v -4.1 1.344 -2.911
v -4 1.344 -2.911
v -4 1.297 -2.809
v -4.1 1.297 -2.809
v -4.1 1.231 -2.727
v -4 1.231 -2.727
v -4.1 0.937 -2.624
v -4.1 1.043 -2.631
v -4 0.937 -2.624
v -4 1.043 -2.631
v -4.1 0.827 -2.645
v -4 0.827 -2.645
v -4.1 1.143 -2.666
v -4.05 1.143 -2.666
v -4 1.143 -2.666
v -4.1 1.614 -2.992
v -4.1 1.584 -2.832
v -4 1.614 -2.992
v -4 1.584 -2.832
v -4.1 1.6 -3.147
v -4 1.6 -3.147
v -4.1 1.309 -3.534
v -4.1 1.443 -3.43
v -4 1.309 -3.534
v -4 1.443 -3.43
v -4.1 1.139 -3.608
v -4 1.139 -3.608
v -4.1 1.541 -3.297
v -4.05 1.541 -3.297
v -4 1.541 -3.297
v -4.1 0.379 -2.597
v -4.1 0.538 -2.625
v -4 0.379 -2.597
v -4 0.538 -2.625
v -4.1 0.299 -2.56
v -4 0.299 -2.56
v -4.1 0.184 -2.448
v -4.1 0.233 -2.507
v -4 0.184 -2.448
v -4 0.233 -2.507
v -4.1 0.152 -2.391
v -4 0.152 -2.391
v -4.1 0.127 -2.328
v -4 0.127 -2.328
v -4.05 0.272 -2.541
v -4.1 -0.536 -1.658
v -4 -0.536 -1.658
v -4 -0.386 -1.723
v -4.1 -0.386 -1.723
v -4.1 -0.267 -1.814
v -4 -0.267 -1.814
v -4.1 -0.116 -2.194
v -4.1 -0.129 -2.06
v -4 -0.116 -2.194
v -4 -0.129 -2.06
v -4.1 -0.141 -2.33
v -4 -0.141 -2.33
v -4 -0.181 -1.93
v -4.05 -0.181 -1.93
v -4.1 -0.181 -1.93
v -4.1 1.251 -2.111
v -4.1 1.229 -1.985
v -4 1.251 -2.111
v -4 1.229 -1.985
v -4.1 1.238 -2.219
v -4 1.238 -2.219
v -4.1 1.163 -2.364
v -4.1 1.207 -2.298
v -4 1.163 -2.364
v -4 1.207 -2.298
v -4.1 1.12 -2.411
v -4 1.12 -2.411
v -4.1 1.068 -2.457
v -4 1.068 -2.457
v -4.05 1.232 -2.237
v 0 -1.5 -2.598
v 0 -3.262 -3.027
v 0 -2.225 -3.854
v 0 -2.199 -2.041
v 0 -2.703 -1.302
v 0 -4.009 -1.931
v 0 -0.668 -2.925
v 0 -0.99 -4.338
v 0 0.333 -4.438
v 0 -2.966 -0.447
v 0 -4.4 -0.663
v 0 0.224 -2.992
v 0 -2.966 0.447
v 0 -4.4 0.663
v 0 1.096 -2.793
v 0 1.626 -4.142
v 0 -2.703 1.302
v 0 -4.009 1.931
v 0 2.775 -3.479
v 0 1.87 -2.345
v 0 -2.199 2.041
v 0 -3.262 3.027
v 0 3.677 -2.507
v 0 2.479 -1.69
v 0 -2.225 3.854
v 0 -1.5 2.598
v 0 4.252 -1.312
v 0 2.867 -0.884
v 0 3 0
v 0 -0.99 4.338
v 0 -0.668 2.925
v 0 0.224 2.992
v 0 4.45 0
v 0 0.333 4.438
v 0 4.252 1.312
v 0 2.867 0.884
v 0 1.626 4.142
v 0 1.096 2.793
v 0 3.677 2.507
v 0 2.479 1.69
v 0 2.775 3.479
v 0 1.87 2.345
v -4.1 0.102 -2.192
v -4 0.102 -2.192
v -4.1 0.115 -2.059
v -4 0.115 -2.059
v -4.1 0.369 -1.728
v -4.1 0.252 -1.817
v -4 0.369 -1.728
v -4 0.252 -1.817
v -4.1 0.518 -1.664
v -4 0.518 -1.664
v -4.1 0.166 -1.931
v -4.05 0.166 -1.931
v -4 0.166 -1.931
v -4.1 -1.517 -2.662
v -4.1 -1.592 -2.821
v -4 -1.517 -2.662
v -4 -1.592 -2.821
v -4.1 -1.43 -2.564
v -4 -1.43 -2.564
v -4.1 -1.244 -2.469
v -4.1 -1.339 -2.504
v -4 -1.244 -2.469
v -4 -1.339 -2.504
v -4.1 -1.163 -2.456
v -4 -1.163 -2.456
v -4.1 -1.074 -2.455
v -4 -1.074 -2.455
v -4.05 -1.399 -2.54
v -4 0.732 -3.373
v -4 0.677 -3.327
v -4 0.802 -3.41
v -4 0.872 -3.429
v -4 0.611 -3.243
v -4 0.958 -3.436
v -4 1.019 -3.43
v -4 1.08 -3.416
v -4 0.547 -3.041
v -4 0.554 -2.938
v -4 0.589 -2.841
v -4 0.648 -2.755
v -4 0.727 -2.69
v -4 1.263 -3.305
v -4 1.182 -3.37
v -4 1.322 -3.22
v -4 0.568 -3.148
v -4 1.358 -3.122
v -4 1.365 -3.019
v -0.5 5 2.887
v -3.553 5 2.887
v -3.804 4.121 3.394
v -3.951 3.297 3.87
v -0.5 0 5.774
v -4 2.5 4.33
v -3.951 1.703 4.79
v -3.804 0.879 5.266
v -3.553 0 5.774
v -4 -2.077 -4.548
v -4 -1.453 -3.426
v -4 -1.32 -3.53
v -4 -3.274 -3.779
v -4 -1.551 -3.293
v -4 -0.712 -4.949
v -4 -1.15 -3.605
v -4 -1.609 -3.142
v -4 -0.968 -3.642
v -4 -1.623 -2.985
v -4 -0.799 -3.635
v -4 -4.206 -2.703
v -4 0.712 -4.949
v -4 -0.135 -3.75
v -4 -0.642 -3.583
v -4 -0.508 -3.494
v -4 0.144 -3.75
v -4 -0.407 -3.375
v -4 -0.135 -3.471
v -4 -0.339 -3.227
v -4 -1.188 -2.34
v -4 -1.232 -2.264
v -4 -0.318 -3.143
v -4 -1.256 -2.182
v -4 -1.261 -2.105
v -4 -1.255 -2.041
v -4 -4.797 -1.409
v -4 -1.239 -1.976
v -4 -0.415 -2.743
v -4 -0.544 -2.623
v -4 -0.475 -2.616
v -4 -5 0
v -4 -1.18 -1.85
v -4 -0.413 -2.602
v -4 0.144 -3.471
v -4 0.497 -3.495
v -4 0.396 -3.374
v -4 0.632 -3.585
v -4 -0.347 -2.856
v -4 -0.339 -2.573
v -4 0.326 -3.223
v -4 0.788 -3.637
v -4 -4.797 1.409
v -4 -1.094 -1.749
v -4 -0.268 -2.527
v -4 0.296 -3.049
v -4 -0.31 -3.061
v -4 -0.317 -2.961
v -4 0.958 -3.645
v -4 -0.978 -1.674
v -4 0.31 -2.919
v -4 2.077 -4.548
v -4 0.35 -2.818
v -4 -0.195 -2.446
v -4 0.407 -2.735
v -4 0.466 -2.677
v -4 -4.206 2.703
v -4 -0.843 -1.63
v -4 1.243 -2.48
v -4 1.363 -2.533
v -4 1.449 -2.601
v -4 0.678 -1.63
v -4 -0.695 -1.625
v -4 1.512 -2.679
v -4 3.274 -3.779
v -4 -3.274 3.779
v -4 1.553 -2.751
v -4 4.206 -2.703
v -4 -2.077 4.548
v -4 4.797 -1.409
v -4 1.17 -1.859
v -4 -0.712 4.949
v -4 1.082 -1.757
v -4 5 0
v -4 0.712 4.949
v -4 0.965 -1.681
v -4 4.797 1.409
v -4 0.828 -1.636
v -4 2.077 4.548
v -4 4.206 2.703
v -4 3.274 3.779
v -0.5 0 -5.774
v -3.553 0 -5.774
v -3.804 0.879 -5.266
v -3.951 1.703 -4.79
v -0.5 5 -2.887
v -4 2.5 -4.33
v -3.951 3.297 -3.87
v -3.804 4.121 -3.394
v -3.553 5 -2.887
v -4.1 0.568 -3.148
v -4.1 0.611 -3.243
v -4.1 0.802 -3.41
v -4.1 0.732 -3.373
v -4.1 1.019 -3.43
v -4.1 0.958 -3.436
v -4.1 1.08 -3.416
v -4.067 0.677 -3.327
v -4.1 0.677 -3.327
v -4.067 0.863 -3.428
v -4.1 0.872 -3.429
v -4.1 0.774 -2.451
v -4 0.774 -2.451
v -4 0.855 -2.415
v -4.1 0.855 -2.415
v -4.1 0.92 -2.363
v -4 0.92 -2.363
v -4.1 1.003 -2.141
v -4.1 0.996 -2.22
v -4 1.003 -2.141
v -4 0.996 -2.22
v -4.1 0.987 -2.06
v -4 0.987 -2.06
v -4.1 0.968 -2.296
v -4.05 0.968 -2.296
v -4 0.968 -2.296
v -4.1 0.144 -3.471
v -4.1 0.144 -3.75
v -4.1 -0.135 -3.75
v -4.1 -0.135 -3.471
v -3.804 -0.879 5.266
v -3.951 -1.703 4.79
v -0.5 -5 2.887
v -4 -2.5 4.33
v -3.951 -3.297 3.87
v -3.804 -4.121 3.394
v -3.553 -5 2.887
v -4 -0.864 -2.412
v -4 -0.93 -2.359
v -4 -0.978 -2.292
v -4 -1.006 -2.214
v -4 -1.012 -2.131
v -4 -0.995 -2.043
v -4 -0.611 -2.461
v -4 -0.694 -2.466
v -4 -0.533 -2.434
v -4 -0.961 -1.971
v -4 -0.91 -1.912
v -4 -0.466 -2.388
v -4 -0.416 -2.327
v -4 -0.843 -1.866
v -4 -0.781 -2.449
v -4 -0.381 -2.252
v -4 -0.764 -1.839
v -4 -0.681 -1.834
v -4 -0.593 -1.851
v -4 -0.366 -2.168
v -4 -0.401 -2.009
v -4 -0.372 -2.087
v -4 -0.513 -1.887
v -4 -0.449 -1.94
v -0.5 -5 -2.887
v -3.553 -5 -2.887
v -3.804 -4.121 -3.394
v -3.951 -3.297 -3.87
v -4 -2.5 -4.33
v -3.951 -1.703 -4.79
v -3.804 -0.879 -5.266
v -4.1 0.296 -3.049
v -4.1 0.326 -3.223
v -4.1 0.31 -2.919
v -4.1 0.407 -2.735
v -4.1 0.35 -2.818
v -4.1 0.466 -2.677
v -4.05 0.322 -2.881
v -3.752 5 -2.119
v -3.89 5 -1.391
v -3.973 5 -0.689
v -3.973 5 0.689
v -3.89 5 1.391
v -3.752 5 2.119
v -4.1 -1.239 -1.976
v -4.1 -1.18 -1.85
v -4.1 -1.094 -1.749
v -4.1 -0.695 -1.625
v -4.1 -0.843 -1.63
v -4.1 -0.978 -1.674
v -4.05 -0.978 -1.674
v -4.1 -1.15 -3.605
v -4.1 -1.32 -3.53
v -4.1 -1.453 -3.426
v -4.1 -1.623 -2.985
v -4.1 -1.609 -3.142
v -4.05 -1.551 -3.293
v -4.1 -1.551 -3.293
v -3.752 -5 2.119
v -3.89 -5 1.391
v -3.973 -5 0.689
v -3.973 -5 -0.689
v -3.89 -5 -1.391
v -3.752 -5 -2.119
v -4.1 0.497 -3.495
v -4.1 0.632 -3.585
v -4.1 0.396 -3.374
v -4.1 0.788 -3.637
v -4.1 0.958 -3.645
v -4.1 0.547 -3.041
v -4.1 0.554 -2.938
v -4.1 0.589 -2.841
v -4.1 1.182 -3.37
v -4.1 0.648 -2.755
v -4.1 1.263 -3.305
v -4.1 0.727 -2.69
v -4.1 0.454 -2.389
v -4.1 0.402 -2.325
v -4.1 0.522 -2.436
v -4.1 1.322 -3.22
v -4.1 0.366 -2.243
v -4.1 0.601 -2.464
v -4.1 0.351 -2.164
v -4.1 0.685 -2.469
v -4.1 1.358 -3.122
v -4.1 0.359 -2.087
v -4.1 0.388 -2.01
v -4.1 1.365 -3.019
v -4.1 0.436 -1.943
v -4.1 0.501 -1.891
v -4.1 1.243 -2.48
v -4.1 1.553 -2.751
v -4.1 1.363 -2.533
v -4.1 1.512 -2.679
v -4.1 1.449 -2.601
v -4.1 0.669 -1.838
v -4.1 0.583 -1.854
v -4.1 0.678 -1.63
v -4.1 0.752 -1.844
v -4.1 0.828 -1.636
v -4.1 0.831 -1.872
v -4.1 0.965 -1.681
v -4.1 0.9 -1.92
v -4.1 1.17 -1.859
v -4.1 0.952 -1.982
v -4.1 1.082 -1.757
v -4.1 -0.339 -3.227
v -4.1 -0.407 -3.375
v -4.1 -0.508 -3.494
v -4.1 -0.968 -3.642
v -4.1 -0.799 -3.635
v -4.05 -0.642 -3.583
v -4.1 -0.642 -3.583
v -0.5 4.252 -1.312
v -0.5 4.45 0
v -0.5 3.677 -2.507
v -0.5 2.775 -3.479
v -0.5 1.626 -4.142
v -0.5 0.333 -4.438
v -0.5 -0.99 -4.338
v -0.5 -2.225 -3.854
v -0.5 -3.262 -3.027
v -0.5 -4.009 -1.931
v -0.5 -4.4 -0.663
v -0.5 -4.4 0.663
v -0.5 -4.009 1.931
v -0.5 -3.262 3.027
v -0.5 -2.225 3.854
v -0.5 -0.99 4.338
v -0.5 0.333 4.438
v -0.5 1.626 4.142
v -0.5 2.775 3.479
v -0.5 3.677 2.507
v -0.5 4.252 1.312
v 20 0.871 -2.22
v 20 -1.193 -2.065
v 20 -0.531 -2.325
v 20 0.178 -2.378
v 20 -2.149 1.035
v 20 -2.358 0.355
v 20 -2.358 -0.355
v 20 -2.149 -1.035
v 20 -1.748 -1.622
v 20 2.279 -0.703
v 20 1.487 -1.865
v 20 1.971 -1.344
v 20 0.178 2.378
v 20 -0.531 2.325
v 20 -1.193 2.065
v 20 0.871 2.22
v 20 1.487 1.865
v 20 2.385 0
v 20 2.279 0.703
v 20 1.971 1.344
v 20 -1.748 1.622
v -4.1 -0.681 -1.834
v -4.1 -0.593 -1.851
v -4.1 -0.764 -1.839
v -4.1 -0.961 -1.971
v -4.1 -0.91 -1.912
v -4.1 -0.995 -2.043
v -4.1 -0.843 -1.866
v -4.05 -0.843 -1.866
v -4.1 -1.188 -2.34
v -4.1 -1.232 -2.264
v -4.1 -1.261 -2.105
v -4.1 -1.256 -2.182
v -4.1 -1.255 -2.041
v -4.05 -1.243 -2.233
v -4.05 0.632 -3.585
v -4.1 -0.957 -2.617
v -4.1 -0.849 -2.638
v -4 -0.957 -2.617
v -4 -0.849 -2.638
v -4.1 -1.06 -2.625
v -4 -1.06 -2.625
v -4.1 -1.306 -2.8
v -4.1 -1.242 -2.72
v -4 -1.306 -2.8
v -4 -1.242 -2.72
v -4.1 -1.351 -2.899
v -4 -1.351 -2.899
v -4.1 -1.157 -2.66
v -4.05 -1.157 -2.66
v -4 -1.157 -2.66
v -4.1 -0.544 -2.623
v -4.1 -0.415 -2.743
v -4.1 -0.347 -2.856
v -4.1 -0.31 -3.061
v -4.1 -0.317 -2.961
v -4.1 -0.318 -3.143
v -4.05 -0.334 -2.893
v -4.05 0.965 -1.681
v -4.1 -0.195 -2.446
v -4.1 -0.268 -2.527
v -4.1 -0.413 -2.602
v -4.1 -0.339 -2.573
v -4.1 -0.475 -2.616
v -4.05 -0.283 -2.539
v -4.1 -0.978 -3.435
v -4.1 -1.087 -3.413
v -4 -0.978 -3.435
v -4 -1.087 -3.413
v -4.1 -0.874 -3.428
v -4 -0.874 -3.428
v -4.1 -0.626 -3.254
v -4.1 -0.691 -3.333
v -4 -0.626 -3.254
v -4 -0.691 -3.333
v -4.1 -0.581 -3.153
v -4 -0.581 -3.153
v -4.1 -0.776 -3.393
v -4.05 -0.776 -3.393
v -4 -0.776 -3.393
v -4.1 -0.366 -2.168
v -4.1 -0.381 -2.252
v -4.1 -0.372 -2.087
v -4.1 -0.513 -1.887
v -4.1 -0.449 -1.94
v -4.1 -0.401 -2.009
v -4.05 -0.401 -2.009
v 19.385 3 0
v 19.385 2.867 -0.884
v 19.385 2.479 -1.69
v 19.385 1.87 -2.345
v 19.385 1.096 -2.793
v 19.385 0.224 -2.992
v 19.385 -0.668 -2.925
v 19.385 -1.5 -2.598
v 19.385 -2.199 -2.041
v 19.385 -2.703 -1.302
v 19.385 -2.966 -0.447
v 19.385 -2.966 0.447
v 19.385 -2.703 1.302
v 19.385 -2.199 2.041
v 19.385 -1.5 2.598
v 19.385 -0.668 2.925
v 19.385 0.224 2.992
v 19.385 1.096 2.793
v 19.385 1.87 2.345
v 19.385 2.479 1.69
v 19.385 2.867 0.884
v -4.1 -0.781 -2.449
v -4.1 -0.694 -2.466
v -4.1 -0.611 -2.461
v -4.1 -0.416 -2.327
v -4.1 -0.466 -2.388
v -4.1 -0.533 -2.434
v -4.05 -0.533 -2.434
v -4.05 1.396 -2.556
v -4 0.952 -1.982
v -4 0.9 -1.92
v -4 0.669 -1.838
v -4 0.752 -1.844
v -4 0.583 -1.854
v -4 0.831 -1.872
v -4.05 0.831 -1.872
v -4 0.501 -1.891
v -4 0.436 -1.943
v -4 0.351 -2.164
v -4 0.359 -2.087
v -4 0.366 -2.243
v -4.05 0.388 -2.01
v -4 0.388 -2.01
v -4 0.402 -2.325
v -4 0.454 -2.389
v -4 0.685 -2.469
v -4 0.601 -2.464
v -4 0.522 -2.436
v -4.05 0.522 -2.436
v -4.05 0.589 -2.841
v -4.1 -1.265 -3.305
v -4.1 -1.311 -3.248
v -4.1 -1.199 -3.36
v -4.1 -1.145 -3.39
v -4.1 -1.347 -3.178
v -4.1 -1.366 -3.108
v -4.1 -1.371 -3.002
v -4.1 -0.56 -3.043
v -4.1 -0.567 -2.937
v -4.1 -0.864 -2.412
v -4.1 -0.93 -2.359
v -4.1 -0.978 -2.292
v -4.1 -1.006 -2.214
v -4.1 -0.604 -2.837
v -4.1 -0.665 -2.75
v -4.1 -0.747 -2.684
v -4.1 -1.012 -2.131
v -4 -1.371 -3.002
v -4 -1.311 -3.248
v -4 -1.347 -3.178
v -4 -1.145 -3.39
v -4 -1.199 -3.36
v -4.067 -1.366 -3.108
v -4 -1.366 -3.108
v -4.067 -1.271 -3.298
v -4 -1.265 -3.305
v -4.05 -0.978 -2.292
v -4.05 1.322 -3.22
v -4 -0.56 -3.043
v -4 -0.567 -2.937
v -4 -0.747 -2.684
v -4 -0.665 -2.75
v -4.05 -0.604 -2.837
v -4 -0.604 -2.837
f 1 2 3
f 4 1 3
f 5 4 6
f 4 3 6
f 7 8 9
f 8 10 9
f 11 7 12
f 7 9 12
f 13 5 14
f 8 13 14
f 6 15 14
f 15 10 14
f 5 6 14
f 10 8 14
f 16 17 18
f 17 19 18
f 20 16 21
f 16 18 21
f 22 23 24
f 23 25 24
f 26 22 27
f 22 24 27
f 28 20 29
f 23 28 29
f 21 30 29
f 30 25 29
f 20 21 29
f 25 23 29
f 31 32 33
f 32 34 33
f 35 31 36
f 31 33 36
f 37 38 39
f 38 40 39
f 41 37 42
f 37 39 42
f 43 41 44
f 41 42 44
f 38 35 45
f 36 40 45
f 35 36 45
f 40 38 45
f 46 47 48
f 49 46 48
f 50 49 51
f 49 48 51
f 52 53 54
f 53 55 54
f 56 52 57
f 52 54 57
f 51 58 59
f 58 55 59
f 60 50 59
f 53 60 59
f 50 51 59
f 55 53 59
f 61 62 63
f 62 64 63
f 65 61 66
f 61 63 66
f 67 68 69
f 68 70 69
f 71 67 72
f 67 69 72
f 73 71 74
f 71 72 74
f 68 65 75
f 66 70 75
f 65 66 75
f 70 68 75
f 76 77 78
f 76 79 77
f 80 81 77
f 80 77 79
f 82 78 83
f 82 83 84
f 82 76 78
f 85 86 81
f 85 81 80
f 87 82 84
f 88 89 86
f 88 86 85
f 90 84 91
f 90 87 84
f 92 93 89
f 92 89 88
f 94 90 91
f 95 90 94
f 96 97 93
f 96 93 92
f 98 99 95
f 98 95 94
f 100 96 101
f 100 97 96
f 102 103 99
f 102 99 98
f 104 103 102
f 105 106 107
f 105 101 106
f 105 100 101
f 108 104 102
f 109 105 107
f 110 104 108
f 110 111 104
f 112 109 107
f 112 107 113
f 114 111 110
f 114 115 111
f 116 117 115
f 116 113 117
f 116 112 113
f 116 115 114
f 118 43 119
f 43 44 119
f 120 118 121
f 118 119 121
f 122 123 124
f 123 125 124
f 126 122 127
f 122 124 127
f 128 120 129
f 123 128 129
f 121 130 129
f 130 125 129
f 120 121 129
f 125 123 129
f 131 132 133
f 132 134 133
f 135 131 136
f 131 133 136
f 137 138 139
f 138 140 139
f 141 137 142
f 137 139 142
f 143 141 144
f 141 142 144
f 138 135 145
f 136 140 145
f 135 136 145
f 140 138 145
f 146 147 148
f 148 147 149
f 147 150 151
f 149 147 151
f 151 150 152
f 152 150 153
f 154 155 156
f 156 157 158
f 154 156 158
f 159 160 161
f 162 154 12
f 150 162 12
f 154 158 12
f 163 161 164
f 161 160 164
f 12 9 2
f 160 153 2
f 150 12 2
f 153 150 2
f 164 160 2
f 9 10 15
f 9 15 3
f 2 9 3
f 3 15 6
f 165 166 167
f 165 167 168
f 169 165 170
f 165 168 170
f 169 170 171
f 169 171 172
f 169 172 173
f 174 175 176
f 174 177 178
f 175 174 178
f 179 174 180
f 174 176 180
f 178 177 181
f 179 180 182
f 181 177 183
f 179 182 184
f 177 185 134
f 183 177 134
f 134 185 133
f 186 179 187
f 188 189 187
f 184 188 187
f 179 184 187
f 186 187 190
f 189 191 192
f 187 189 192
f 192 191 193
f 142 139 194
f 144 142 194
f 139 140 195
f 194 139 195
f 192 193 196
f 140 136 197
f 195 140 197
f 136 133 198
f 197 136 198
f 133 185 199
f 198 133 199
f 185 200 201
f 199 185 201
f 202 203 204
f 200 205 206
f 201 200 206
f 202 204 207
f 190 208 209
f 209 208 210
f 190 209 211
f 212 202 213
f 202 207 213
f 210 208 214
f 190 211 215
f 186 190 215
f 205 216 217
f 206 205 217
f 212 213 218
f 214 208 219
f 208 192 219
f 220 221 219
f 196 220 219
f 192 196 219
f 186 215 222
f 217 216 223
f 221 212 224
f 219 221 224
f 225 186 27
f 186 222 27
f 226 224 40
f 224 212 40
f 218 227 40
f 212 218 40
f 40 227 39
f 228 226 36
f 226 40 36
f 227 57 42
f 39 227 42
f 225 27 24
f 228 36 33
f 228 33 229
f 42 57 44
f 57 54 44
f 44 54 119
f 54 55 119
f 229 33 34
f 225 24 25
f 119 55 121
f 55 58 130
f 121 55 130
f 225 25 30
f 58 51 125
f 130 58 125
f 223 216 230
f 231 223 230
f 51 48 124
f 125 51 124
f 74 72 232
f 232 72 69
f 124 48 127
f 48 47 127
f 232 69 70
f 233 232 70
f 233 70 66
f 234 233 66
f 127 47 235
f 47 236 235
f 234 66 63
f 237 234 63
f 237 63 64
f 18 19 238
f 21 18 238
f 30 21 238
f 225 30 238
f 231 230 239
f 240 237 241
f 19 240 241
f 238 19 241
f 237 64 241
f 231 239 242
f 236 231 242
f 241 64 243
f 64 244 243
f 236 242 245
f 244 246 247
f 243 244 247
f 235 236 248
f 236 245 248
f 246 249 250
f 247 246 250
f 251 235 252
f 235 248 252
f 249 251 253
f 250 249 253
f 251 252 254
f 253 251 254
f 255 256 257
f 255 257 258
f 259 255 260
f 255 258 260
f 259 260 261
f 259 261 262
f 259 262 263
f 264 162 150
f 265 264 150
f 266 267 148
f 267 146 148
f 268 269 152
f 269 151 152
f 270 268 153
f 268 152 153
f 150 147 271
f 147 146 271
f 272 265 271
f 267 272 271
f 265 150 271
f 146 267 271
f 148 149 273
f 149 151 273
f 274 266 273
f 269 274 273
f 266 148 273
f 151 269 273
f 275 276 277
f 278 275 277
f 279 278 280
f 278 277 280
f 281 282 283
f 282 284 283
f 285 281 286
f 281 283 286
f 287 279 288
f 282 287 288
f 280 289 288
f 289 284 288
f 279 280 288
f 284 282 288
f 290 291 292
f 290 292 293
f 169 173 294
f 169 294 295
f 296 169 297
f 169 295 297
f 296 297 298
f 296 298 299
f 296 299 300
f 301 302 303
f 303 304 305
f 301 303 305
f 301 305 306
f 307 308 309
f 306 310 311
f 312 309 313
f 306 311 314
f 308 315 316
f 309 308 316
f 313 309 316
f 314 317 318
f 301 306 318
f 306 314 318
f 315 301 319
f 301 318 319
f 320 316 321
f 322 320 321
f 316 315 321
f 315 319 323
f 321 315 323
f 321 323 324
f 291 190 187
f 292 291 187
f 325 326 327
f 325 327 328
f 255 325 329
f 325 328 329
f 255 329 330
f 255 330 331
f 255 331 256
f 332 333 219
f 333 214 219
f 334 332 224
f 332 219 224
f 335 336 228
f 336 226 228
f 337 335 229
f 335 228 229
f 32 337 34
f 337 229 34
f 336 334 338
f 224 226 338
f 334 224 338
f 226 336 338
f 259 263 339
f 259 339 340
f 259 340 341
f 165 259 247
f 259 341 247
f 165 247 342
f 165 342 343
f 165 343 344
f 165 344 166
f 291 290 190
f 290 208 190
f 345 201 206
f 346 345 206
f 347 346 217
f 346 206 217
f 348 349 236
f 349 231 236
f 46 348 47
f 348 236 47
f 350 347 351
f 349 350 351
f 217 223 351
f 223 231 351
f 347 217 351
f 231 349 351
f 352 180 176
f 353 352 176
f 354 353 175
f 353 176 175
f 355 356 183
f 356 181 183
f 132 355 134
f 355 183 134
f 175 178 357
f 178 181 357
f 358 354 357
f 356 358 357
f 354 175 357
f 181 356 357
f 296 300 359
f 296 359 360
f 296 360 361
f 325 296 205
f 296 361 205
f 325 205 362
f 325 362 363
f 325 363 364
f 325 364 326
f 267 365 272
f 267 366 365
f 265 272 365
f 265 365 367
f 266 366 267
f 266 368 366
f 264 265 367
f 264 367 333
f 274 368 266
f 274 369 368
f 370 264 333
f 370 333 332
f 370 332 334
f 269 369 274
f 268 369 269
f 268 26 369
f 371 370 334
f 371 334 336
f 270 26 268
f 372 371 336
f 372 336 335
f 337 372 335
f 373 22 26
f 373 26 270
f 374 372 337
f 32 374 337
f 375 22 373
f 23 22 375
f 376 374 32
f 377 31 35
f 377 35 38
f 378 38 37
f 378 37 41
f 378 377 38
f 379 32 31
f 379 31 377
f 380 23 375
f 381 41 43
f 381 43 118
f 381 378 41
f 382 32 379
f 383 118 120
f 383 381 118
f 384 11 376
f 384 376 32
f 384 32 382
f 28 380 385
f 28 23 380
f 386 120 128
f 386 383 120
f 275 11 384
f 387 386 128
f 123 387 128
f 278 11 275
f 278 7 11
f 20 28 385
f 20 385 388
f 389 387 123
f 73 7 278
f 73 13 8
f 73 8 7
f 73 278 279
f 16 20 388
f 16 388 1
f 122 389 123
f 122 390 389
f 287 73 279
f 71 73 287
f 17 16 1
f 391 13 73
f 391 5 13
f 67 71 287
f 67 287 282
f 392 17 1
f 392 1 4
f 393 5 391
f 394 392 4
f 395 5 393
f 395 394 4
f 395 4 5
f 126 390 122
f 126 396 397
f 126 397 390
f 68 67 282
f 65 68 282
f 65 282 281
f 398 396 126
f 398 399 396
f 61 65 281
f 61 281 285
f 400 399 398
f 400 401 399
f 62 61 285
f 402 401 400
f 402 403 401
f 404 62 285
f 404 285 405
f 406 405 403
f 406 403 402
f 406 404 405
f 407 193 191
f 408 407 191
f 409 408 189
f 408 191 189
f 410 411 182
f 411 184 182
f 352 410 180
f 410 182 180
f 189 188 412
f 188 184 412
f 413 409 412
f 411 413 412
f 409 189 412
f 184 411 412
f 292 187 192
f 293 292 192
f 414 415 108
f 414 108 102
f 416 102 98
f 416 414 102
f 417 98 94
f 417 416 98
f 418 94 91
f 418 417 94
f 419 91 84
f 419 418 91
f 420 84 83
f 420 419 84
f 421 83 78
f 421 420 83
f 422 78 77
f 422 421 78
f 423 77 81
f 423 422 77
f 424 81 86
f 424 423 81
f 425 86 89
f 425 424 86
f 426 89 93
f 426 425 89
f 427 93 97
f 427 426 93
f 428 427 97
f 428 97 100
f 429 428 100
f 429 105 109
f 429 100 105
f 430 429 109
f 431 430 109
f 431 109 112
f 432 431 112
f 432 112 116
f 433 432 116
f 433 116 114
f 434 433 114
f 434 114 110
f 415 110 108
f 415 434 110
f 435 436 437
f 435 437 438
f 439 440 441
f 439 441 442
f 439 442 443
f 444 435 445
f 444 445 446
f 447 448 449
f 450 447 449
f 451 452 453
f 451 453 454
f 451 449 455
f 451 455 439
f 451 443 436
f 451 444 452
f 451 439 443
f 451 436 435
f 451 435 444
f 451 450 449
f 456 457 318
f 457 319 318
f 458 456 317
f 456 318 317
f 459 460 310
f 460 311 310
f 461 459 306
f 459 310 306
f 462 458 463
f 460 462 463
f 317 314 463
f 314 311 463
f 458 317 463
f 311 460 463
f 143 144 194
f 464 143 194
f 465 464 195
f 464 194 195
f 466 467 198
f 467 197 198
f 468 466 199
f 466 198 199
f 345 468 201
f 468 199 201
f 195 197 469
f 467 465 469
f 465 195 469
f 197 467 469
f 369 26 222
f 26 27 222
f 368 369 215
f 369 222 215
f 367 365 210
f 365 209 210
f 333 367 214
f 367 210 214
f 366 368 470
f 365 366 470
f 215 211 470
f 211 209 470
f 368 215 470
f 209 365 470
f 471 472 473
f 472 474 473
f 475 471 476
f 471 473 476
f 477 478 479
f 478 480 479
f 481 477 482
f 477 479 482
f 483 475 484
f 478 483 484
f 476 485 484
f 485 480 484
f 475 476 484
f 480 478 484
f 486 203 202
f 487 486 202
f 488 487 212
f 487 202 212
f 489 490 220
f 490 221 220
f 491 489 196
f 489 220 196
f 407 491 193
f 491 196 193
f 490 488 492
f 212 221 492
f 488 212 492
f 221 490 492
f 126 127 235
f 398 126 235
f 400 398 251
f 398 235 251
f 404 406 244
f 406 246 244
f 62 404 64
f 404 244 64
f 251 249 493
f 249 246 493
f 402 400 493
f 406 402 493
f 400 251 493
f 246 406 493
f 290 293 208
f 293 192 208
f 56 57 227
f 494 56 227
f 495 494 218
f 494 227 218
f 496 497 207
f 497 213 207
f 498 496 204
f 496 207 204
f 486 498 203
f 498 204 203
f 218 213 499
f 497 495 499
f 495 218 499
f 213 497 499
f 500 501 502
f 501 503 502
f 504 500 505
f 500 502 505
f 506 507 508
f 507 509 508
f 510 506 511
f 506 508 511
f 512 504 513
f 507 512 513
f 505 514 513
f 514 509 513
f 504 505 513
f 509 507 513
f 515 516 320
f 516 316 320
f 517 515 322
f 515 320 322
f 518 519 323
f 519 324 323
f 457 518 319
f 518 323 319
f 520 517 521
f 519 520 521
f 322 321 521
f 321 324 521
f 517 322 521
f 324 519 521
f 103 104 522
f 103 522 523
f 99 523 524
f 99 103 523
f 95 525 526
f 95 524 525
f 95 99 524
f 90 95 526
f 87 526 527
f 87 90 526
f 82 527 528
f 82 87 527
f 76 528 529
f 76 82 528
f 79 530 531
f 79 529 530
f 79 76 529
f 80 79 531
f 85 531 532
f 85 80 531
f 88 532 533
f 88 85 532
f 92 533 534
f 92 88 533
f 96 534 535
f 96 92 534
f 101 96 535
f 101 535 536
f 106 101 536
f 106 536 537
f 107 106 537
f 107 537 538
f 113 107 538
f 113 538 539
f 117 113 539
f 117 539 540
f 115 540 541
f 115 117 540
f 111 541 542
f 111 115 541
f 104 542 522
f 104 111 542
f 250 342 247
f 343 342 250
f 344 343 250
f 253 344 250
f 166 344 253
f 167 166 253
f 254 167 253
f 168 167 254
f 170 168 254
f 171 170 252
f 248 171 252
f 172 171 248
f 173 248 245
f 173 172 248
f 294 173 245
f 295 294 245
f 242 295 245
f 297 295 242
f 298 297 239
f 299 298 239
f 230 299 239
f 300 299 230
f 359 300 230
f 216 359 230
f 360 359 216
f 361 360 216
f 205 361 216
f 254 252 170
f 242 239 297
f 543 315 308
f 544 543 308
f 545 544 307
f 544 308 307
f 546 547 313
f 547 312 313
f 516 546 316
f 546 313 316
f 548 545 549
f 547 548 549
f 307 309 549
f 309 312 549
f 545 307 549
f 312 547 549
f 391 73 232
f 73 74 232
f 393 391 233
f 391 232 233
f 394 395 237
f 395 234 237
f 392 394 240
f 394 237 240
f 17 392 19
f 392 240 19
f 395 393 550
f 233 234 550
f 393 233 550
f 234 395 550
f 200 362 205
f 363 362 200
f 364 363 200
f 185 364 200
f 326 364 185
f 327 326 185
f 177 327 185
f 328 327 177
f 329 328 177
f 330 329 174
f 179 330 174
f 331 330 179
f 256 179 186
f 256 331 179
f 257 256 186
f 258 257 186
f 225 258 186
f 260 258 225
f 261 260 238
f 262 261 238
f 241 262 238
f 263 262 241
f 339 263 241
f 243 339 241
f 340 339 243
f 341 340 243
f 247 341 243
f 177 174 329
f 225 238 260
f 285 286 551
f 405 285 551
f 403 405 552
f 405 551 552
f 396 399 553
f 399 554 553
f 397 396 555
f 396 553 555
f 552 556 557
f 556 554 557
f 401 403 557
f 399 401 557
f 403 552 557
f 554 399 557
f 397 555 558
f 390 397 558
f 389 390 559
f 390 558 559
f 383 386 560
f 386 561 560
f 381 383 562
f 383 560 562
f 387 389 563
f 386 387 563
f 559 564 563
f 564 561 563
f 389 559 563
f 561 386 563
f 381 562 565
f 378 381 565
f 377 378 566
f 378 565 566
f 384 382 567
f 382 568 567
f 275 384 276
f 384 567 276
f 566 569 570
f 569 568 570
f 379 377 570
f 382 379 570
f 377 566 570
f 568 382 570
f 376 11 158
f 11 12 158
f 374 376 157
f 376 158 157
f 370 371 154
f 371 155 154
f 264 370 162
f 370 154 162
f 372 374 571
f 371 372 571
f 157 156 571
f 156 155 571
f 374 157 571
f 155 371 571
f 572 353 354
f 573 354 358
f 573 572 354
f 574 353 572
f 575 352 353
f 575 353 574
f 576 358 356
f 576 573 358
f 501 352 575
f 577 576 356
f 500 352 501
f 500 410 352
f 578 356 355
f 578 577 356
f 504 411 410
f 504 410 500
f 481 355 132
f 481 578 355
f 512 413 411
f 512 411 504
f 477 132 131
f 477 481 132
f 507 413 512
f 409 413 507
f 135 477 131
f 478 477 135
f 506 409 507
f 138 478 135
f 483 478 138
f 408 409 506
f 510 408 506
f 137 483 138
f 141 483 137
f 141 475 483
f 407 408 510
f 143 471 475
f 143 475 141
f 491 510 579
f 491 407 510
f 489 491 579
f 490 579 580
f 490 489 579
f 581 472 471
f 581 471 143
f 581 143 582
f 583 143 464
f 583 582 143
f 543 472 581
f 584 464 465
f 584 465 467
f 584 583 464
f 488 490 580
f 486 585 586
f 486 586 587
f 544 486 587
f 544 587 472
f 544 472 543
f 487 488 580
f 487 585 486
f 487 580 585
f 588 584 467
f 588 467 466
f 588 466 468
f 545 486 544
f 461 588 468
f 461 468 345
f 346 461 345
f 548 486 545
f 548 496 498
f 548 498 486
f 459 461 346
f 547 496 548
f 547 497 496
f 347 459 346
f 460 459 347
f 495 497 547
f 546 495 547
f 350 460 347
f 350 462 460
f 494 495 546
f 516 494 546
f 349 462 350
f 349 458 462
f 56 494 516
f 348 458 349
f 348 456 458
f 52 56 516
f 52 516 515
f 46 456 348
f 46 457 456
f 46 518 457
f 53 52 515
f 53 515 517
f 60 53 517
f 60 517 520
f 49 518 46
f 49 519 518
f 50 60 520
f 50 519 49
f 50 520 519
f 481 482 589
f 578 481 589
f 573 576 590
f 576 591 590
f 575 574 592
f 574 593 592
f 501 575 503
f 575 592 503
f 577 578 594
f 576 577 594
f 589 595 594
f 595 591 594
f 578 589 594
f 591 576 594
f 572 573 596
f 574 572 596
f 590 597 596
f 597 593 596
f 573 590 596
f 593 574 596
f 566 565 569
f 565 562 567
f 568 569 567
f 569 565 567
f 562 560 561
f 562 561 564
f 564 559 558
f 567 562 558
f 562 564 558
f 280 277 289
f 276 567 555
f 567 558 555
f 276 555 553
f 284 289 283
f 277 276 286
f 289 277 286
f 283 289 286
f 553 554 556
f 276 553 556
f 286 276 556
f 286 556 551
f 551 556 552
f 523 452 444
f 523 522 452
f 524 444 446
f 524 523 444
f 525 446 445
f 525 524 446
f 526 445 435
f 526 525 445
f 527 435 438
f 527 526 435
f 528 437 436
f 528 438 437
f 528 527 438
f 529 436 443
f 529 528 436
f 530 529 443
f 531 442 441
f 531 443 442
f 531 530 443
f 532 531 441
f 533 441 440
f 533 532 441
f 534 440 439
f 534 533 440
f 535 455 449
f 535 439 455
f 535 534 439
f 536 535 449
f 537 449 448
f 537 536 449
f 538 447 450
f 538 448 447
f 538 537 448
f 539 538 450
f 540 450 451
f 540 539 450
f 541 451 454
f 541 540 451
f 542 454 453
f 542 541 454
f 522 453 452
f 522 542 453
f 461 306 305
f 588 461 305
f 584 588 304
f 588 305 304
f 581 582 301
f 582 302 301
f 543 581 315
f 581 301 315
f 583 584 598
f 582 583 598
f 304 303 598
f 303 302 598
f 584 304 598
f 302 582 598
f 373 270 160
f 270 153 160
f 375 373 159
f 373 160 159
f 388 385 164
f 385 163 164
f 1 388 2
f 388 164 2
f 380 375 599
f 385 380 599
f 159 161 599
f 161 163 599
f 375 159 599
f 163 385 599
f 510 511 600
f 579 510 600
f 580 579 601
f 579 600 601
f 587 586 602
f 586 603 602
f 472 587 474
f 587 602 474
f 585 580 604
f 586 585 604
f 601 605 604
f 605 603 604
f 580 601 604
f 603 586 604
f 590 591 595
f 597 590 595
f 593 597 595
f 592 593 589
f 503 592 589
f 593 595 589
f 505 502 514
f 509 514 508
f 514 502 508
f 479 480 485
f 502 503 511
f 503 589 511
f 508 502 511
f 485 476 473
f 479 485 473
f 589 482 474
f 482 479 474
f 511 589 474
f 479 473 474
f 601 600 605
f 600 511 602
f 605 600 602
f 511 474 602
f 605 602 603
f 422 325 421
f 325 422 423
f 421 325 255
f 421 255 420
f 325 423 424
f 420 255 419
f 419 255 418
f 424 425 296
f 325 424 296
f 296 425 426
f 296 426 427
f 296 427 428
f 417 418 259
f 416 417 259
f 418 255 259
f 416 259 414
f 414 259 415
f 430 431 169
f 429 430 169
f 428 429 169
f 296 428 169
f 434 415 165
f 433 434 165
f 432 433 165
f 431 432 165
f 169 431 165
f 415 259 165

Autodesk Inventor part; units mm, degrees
ref_plane "YZ Plane" through (0, 0, 0) normal (1, 0, 0) x (0, 1, 0)
ref_plane "XZ Plane" through (0, 0, 0) normal (0, 1, 0) x (-1, 0, 0)
ref_plane "XY Plane" through (0, 0, 0) normal (0, 0, 1) x (1, 0, 0)
sketch "Sketch1" plane through (0, 0, 0) normal (0, 0, 1) x (1, 0, 0)
  line L0 (-8.8, 0) -> (24.8, 0) projected
  line L1 (20, 0) -> (20, 2.385)
  line L2 (20, 2.385) -> (19.385, 3)
  line L3 (19.385, 3) -> (0, 3)
  line L4 (0, 3) -> (0, 4.45)
  line L5 (0, 4.45) -> (-0.5, 4.45)
  line L6 (-0.5, 4.45) -> (-0.5, 5)
  line L7 (-0.5, 5) -> (-4, 5)
  line L8 (-4, 5) -> (-4, 0)
  point P0 (0, 0)
  dimension "d0" = 6
  dimension "d1" = 20
  dimension "d2" = 10
  dimension "d3" = 8.9
  dimension "d4" = 4
  dimension "d5" = 45
  dimension "d6" = 4.77
  dimension "d7" = 0.5
revolve "Revolution1" add sketch "Sketch1" angle 360 about axis through (-10, 0, 0) along (1, 0, 0)
sketch "Sketch2" plane through (-4, 0, 0) normal (-1, 0, 0) x (0, 0, 1)
  circle A0 centre (0, 0) radius 5 projected
  line L0 (2.8868, 5) -> (5.7735, 0)
  line L1 (5.7735, 0) -> (2.8868, -5)
  line L2 (2.8868, -5) -> (-2.8868, -5)
  line L3 (-2.8868, -5) -> (-5.7735, 0)
  line L4 (-5.7735, 0) -> (-2.8868, 5)
  line L5 (-2.8868, 5) -> (2.8868, 5)
  point P0 (0, 5)
extrude "Extrusion1" add sketch "Sketch2" against normal up to surface (3.5 mm away)
sketch "Sketch3" plane through (0, 0, 0) normal (0, 0, 1) x (1, 0, 0)
  line L0 (-4, 5.55) -> (-0.5, 5.55)
  line L1 (-0.5, 5.55) -> (-0.5, 6.66)
  line L2 (-0.5, 6.66) -> (-4, 6.66)
  line L3 (-4, 6.66) -> (-4, 5.55)
  line L4 (-4.8, 0) -> (0.8, 0) projected
  line L5 (-4, 5) -> (-3.0416, 6.66)
  line L6 (-4, 5.55) -> (-4, 5)
  point P0 (0, 0)
  point P1 (-0.5, 5)
  dimension "d11" = 11.1
  dimension "d12" = 1.11
  dimension "d13" = 30
revolve "Revolution2" cut sketch "Sketch3" angle 360 about axis through (-10, 0, 0) along (1, 0, 0) contours L3 L2 L5 L0 | L0 L5 L6
thread "Thread1" size "M6x1" class "6g" standard "ISO Metric profile" full length
sketch "Sketch4" plane through (-4, 0, 0) normal (-1, 0, 0) x (0, 0, 1)
  circle A0 centre (0, 0) radius 3.75 construction
  spline S0 degree 2 poles (-2.4547, -1.0741) (-2.3544, -1.2038) (-2.112, -1.282) (-1.9755, -1.2387) knots 0 0 0 1 2 2 2
  spline S1 degree 2 poles (-1.9755, -1.2387) (-1.7677, -1.1728) (-1.5794, -0.7835) (-1.6577, -0.5365) knots 0 0 0 1 2 2 2
  spline S2 degree 2 poles (-1.6577, -0.5365) (-1.7371, -0.2866) (-2.1226, -0.0747) (-2.3304, -0.1406) knots 0 0 0 1 2 2 2
  spline S3 degree 2 poles (-2.3304, -0.1406) (-2.4626, -0.1826) (-2.6145, -0.3843) (-2.623, -0.5438) knots 0 0 0 1 2 2 2
  spline S4 degree 2 poles (-2.623, -0.5438) (-2.736, -0.3845) (-3.0498, -0.2826) (-3.227, -0.3389) knots 0 0 0 1 2 2 2
  spline S5 degree 2 poles (-3.227, -0.3389) (-3.4711, -0.4163) (-3.6941, -0.8677) (-3.6047, -1.1496) knots 0 0 0 1 2 2 2
  spline S6 degree 2 poles (-3.6047, -1.1496) (-3.5152, -1.4315) (-3.0713, -1.6712) (-2.8214, -1.5919) knots 0 0 0 1 2 2 2
  spline S7 degree 2 poles (-2.8214, -1.5919) (-2.6354, -1.5329) (-2.444, -1.2642) (-2.4547, -1.0741) knots 0 0 0 1 2 2 2
  spline S8 degree 2 poles (-2.8994, -1.3512) (-2.9996, -1.383) (-3.217, -1.348) (-3.3792, -1.1948) (-3.4133, -1.0873) knots 0 0 0 1 2 3 3 3
  spline S9 degree 2 poles (-3.4133, -1.0873) (-3.4668, -0.9187) (-3.319, -0.6335) (-3.1534, -0.581) knots 0 0 0 1 2 2 2
  spline S10 degree 2 poles (-3.1534, -0.581) (-2.9834, -0.527) (-2.6915, -0.6807) (-2.638, -0.8492) knots 0 0 0 1 2 2 2
  spline S11 degree 2 poles (-2.638, -0.8492) (-2.5855, -1.0149) (-2.7352, -1.2991) (-2.8994, -1.3512) knots 0 0 0 1 2 2 2
  spline S12 degree 2 poles (-2.0433, -0.9947) (-2.1784, -1.0376) (-2.4047, -0.9191) (-2.4486, -0.7811) knots 0 0 0 1 2 2 2
  spline S13 degree 2 poles (-2.4486, -0.7811) (-2.4914, -0.646) (-2.3759, -0.4206) (-2.2524, -0.3814) knots 0 0 0 1 2 2 2
  spline S14 degree 2 poles (-2.2524, -0.3814) (-2.1245, -0.3408) (-1.8929, -0.4608) (-1.8509, -0.593) knots 0 0 0 1 2 2 2
  spline S15 degree 2 poles (-1.8509, -0.593) (-1.808, -0.7282) (-1.9242, -0.9569) (-2.0433, -0.9947) knots 0 0 0 1 2 2 2
  line L0 (-3.75, -0.1349) -> (-3.471, -0.1349)
  line L1 (-3.471, -0.1349) -> (-3.471, 0.1441)
  line L2 (-3.471, 0.1441) -> (-3.75, 0.1441)
  line L3 (-3.75, 0.1441) -> (-3.75, -0.1349)
  spline S16 degree 2 poles (-2.6249, 0.538) (-2.6177, 0.3742) (-2.4648, 0.1705) (-2.3282, 0.1272) knots 0 0 0 1 2 2 2
  spline S17 degree 2 poles (-2.3282, 0.1272) (-2.1205, 0.0612) (-1.7421, 0.2706) (-1.6637, 0.5176) knots 0 0 0 1 2 2 2
  spline S18 degree 2 poles (-1.6637, 0.5176) (-1.5844, 0.7675) (-1.7772, 1.163) (-1.985, 1.2289) knots 0 0 0 1 2 2 2
  spline S19 degree 2 poles (-1.985, 1.2289) (-2.1172, 1.2709) (-2.3576, 1.1936) (-2.4566, 1.0683) knots 0 0 0 1 2 2 2
  spline S20 degree 2 poles (-2.4566, 1.0683) (-2.457, 1.2636) (-2.6546, 1.5278) (-2.8319, 1.5841) knots 0 0 0 1 2 2 2
  spline S21 degree 2 poles (-2.8319, 1.5841) (-3.076, 1.6615) (-3.5184, 1.4213) (-3.6079, 1.1394) knots 0 0 0 1 2 2 2
  spline S22 degree 2 poles (-3.6079, 1.1394) (-3.6973, 0.8576) (-3.4729, 0.4057) (-3.223, 0.3264) knots 0 0 0 1 2 2 2
  spline S23 degree 2 poles (-3.223, 0.3264) (-3.037, 0.2674) (-2.7257, 0.3765) (-2.6249, 0.538) knots 0 0 0 1 2 2 2
  spline S24 degree 2 poles (-3.1479, 0.568) (-3.2482, 0.5999) (-3.4056, 0.7538) (-3.4498, 0.9725) (-3.4156, 1.08) knots 0 0 0 1 2 3 3 3
  spline S25 degree 2 poles (-3.4156, 1.08) (-3.3621, 1.2486) (-3.0769, 1.3963) (-2.9113, 1.3438) knots 0 0 0 1 2 2 2
  spline S26 degree 2 poles (-2.9113, 1.3438) (-2.7413, 1.2898) (-2.5915, 0.996) (-2.645, 0.8274) knots 0 0 0 1 2 2 2
  spline S27 degree 2 poles (-2.645, 0.8274) (-2.6975, 0.6618) (-2.9837, 0.5159) (-3.1479, 0.568) knots 0 0 0 1 2 2 2
  spline S28 degree 2 poles (-2.243, 0.3656) (-2.3781, 0.4085) (-2.4947, 0.6358) (-2.4509, 0.7738) knots 0 0 0 1 2 2 2
  spline S29 degree 2 poles (-2.4509, 0.7738) (-2.408, 0.909) (-2.1836, 1.0265) (-2.0601, 0.9873) knots 0 0 0 1 2 2 2
  spline S30 degree 2 poles (-2.0601, 0.9873) (-1.9322, 0.9467) (-1.8122, 0.7151) (-1.8542, 0.5829) knots 0 0 0 1 2 2 2
  spline S31 degree 2 poles (-1.8542, 0.5829) (-1.897, 0.4477) (-2.1238, 0.3278) (-2.243, 0.3656) knots 0 0 0 1 2 2 2
  dimension "d17" = 7.5
extrude "Extrusion2" add sketch "Sketch4" along normal blind 0.1
equation "\"d7\" = 0.125 * d4"
equation "\"d12\" = 0.1 * d11"
properties part number "Sechskantschraube ISO 4017-M6x20-8.8" material "Steel"
